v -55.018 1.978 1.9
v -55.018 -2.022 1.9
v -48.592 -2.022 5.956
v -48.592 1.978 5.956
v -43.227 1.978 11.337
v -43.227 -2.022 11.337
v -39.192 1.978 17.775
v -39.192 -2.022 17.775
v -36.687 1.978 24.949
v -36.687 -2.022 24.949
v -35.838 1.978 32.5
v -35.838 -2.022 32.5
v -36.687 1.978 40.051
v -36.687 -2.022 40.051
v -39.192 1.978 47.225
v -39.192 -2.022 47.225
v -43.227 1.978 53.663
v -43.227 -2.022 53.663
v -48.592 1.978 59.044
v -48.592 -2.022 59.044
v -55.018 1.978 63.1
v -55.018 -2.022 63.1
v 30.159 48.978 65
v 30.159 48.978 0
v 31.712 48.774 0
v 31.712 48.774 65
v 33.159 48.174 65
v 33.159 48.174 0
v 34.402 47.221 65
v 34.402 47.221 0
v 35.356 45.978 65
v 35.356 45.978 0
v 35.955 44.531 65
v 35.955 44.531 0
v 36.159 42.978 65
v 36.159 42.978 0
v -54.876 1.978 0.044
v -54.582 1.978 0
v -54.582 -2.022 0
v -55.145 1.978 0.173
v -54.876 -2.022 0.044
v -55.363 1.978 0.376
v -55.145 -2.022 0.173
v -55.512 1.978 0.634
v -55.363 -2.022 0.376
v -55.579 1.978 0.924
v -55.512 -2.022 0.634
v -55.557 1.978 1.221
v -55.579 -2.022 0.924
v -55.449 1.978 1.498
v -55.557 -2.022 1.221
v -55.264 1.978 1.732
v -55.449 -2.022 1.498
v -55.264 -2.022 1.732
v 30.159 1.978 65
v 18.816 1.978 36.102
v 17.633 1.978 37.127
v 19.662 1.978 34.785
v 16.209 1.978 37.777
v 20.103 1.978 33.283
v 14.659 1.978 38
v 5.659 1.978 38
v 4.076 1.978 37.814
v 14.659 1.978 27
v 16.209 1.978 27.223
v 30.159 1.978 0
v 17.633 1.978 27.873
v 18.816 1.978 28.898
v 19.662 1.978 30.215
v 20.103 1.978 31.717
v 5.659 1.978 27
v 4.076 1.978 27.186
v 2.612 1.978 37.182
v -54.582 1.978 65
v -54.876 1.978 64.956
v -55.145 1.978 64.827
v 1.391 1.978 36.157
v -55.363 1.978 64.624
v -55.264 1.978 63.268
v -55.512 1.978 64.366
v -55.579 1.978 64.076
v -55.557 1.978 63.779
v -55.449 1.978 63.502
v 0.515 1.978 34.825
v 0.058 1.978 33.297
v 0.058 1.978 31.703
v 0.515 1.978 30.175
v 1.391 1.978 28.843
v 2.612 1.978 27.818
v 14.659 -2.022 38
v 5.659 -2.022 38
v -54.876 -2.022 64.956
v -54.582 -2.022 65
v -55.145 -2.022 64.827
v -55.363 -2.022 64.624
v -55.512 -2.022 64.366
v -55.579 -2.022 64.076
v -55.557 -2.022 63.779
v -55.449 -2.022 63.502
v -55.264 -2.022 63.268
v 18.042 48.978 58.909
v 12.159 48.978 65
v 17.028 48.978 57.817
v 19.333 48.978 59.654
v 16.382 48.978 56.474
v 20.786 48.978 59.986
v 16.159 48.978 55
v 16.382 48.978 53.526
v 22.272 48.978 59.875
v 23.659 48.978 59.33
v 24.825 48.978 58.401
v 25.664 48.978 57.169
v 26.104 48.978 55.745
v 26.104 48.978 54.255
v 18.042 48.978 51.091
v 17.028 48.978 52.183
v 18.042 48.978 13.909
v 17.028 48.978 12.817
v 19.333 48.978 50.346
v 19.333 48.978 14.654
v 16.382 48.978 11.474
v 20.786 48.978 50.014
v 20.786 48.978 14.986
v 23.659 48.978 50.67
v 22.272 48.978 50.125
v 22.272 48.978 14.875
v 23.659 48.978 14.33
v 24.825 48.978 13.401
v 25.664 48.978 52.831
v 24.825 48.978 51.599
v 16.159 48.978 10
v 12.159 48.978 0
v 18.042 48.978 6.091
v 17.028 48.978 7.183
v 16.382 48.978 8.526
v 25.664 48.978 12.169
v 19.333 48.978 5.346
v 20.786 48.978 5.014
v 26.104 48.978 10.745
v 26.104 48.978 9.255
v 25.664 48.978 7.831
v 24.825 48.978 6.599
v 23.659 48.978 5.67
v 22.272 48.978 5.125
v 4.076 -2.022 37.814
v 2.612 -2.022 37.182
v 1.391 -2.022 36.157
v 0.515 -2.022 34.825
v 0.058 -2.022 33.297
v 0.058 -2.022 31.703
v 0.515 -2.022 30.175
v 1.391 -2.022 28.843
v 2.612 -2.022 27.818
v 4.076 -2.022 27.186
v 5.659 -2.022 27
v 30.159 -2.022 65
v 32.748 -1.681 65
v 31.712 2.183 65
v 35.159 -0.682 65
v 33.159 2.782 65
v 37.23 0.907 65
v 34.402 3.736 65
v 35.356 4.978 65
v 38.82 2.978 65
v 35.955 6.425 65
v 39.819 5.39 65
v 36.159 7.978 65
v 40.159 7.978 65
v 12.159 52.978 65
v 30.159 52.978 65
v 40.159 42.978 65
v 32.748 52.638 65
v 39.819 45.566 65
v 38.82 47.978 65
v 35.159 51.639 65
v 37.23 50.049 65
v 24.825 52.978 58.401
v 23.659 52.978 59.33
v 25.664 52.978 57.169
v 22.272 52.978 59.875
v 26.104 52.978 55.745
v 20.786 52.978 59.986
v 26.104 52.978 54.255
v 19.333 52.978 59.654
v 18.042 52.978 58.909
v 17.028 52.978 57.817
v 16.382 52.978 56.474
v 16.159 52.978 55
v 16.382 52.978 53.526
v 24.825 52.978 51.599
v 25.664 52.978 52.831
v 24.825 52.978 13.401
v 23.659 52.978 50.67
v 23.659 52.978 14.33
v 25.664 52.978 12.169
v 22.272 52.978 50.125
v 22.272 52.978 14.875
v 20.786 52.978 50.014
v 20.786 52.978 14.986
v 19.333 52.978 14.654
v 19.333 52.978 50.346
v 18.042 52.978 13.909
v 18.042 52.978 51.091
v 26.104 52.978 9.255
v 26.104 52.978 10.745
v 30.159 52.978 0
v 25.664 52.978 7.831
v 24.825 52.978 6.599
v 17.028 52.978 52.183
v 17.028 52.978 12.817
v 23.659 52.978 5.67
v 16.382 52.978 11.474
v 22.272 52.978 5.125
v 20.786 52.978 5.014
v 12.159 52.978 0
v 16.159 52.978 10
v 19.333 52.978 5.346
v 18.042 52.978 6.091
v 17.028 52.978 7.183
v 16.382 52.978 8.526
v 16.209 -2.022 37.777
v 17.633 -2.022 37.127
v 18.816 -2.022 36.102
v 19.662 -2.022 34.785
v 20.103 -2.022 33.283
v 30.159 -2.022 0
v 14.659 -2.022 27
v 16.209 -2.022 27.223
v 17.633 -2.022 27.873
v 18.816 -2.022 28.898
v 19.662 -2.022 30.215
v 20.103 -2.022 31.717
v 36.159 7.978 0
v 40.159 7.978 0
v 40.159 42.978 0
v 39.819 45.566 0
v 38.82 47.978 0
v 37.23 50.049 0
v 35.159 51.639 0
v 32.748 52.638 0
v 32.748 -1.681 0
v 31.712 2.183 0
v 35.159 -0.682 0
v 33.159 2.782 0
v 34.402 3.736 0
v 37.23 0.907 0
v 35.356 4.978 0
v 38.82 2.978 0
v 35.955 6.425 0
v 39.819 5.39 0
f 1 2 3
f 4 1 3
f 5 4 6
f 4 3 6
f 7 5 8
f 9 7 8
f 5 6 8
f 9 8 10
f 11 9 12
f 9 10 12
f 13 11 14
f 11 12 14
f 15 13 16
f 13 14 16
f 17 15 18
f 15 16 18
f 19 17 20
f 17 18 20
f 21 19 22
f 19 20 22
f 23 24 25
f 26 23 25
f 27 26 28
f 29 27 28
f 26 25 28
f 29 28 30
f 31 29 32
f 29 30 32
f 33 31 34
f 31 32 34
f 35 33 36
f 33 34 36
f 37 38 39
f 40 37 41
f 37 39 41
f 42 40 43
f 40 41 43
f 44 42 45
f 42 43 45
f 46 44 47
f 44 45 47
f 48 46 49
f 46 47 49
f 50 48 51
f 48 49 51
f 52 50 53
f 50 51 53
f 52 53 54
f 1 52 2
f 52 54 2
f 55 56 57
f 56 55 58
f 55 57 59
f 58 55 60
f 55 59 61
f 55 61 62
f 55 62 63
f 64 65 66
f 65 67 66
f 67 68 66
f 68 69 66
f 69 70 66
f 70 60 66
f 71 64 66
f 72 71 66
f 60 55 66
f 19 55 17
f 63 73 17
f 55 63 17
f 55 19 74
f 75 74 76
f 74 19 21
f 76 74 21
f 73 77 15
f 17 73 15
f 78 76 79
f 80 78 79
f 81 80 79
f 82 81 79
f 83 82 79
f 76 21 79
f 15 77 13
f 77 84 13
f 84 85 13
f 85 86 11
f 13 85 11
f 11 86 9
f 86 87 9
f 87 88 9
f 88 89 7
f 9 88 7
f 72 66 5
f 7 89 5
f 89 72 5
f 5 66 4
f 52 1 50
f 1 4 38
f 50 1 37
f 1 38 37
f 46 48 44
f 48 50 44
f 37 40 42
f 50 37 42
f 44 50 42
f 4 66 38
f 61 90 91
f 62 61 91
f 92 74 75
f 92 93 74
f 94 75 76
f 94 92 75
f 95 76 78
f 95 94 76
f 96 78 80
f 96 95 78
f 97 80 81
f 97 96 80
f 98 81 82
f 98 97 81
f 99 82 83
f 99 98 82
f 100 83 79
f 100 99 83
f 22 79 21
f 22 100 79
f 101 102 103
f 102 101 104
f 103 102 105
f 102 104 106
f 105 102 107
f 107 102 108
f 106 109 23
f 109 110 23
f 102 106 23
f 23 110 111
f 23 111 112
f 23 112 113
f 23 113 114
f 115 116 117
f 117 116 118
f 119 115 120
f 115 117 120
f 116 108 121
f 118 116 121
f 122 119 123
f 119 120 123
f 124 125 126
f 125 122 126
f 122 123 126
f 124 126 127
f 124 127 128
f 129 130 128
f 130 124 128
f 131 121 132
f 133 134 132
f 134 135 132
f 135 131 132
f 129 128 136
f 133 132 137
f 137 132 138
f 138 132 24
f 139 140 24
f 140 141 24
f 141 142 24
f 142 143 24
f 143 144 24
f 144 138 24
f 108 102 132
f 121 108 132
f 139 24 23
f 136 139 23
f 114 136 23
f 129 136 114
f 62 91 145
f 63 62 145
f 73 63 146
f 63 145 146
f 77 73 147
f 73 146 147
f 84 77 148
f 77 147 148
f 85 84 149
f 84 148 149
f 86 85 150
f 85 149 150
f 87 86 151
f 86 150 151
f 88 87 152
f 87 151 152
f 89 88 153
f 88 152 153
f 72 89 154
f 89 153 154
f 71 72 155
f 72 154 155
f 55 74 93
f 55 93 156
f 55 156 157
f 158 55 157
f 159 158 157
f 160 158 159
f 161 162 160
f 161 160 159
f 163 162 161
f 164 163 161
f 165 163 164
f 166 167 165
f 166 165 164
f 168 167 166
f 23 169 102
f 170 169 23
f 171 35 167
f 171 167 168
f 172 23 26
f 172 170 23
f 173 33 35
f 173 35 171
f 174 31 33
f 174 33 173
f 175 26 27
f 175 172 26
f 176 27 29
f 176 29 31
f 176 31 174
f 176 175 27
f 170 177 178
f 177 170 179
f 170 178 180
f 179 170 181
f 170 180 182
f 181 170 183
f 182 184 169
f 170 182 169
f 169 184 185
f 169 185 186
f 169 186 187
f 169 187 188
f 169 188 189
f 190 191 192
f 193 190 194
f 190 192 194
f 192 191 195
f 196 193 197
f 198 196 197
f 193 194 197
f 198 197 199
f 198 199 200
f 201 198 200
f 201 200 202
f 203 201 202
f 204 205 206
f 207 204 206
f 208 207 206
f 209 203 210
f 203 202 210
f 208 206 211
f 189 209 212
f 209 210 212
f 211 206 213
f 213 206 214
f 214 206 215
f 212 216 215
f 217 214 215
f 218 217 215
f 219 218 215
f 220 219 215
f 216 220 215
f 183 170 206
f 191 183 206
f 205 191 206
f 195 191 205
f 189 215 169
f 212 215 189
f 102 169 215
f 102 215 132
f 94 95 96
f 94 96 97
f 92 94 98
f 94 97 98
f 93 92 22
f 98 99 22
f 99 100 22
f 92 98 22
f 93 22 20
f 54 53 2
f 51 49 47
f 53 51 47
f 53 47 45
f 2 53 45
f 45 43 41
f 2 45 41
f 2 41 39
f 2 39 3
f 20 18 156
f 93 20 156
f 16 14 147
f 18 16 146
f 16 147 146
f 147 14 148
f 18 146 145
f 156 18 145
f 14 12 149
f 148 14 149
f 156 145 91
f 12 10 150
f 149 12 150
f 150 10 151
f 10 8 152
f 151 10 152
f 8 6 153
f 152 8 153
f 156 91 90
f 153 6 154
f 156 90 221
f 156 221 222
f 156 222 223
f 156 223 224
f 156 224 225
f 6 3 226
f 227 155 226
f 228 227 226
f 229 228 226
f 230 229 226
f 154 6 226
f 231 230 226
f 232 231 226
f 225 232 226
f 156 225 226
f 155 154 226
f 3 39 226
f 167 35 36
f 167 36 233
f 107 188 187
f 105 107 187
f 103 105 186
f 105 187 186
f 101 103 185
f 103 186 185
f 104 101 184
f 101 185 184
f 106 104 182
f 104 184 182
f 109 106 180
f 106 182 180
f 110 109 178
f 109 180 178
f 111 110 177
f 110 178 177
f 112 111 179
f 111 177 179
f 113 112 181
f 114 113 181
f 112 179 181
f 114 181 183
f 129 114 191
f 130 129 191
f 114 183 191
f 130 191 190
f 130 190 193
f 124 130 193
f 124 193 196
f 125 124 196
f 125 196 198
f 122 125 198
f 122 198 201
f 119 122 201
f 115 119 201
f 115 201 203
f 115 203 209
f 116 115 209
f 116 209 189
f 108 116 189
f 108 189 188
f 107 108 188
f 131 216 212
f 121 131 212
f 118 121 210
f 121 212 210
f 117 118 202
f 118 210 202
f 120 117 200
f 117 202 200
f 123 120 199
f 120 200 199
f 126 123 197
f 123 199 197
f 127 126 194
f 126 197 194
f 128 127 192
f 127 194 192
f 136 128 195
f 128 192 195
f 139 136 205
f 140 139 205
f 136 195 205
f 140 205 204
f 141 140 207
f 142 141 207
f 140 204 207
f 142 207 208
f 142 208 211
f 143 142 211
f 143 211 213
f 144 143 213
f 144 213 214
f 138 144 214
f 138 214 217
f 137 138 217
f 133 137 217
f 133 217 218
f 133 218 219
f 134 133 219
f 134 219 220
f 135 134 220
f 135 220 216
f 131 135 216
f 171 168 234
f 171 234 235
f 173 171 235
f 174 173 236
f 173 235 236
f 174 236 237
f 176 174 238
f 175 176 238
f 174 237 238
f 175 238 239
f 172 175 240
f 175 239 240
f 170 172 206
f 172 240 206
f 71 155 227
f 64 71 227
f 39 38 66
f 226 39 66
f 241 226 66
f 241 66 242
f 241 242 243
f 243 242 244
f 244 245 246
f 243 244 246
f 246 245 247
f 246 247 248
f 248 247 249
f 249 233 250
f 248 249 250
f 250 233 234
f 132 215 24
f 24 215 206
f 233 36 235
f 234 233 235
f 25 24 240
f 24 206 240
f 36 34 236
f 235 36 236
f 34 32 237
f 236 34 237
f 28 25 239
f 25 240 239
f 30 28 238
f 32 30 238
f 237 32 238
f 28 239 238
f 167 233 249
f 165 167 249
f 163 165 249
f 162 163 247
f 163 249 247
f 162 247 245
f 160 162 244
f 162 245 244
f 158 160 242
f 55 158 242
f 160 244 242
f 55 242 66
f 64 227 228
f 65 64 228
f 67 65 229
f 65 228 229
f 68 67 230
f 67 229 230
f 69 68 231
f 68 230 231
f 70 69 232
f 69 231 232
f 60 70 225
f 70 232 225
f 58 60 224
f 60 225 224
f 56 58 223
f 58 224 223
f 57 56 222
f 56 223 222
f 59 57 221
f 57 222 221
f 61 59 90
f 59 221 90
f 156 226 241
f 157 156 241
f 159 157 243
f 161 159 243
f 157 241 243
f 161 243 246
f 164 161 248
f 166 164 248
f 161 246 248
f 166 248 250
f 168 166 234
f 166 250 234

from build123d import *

# Parameters (mm, degrees)
F1_DEPTH = 65
F2_R     = 5
F3_DEPTH = 25
F5_DEPTH = 25
F6_R     = 1
F8_DEPTH = 15


with BuildPart() as f1:
    # F0 (on Top) → F1 (new body)
    with BuildSketch(Plane.XY):
        with BuildLine():
            Line((30.1594209448, 52.9782638401), (12.1594209448, 52.9782638401))
            Line((12.1594209448, 52.9782638401), (12.1594209448, 48.9782638401))
            Line((12.1594209448, 48.9782638401), (30.1594209448, 48.9782638401))
            ThreePointArc((30.1594209448, 48.9782638401), (34.4020616319, 47.2209045272), (36.1594209448, 42.9782638401))
            Line((36.1594209448, 42.9782638401), (36.1594209448, 7.9782638401))
            ThreePointArc((36.1594209448, 7.9782638401), (34.4020616319, 3.735623153), (30.1594209448, 1.9782638401))
            Line((30.1594209448, 1.9782638401), (-59.8505790552, 1.9782638401))
            Line((-59.8505790552, 1.9782638401), (-59.8505790552, -2.0217361599))
            Line((-59.8505790552, -2.0217361599), (30.1594209448, -2.0217361599))
            ThreePointArc((30.1594209448, -2.0217361599), (37.2304887566, 0.9071960282), (40.1594209448, 7.9782638401))
            Line((40.1594209448, 7.9782638401), (40.1594209448, 42.9782638401))
            ThreePointArc((40.1594209448, 42.9782638401), (37.2304887566, 50.0493316519), (30.1594209448, 52.9782638401))
        make_face()
    extrude(amount=F1_DEPTH)

    # F2 (on face) → F3 (cut)
    with BuildSketch(Plane(origin=(0, 52.9782638401, 0), x_dir=(-1, 0, 0), z_dir=(0, 1, 0))):
        with Locations((-21.1594209448, 10)):
            Circle(F2_R)
        with Locations((-21.1594209448, 55)):
            Circle(F2_R)
    extrude(amount=-F3_DEPTH, mode=Mode.SUBTRACT)

    # F4 (on face) → F5 (cut)
    with BuildSketch(Plane.XZ.offset(2.0217361599)):
        with BuildLine():
            Line((-59.8505790552, 65), (-59.8505790552, 0))
            ThreePointArc((-59.8505790552, 0), (-35.838071233, 32.5), (-59.8505790552, 65))
        make_face()
    extrude(amount=-F5_DEPTH, mode=Mode.SUBTRACT)

    # F6
    f6_edges = [f1.edges().sort_by_distance(p)[0] for p in [
        (-59.850579, -0.021736, 65),
        (-59.850579, -0.021736, 0),
    ]]
    fillet(f6_edges, radius=F6_R)

    # F7 (on face) → F8 (cut)
    with BuildSketch(Plane.XZ.offset(2.0217361599)):
        with BuildLine():
            ThreePointArc((14.6594209448, 27), (20.1594209448, 32.5), (14.6594209448, 38))
            Line((14.6594209448, 38), (5.6594209448, 38))
            ThreePointArc((5.6594209448, 38), (0, 32.5), (5.6594209448, 27))
            Line((5.6594209448, 27), (10.1594209448, 27))
            Line((10.1594209448, 27), (14.6594209448, 27))
        make_face()
    extrude(amount=-F8_DEPTH, mode=Mode.SUBTRACT)


solid = f1.part
